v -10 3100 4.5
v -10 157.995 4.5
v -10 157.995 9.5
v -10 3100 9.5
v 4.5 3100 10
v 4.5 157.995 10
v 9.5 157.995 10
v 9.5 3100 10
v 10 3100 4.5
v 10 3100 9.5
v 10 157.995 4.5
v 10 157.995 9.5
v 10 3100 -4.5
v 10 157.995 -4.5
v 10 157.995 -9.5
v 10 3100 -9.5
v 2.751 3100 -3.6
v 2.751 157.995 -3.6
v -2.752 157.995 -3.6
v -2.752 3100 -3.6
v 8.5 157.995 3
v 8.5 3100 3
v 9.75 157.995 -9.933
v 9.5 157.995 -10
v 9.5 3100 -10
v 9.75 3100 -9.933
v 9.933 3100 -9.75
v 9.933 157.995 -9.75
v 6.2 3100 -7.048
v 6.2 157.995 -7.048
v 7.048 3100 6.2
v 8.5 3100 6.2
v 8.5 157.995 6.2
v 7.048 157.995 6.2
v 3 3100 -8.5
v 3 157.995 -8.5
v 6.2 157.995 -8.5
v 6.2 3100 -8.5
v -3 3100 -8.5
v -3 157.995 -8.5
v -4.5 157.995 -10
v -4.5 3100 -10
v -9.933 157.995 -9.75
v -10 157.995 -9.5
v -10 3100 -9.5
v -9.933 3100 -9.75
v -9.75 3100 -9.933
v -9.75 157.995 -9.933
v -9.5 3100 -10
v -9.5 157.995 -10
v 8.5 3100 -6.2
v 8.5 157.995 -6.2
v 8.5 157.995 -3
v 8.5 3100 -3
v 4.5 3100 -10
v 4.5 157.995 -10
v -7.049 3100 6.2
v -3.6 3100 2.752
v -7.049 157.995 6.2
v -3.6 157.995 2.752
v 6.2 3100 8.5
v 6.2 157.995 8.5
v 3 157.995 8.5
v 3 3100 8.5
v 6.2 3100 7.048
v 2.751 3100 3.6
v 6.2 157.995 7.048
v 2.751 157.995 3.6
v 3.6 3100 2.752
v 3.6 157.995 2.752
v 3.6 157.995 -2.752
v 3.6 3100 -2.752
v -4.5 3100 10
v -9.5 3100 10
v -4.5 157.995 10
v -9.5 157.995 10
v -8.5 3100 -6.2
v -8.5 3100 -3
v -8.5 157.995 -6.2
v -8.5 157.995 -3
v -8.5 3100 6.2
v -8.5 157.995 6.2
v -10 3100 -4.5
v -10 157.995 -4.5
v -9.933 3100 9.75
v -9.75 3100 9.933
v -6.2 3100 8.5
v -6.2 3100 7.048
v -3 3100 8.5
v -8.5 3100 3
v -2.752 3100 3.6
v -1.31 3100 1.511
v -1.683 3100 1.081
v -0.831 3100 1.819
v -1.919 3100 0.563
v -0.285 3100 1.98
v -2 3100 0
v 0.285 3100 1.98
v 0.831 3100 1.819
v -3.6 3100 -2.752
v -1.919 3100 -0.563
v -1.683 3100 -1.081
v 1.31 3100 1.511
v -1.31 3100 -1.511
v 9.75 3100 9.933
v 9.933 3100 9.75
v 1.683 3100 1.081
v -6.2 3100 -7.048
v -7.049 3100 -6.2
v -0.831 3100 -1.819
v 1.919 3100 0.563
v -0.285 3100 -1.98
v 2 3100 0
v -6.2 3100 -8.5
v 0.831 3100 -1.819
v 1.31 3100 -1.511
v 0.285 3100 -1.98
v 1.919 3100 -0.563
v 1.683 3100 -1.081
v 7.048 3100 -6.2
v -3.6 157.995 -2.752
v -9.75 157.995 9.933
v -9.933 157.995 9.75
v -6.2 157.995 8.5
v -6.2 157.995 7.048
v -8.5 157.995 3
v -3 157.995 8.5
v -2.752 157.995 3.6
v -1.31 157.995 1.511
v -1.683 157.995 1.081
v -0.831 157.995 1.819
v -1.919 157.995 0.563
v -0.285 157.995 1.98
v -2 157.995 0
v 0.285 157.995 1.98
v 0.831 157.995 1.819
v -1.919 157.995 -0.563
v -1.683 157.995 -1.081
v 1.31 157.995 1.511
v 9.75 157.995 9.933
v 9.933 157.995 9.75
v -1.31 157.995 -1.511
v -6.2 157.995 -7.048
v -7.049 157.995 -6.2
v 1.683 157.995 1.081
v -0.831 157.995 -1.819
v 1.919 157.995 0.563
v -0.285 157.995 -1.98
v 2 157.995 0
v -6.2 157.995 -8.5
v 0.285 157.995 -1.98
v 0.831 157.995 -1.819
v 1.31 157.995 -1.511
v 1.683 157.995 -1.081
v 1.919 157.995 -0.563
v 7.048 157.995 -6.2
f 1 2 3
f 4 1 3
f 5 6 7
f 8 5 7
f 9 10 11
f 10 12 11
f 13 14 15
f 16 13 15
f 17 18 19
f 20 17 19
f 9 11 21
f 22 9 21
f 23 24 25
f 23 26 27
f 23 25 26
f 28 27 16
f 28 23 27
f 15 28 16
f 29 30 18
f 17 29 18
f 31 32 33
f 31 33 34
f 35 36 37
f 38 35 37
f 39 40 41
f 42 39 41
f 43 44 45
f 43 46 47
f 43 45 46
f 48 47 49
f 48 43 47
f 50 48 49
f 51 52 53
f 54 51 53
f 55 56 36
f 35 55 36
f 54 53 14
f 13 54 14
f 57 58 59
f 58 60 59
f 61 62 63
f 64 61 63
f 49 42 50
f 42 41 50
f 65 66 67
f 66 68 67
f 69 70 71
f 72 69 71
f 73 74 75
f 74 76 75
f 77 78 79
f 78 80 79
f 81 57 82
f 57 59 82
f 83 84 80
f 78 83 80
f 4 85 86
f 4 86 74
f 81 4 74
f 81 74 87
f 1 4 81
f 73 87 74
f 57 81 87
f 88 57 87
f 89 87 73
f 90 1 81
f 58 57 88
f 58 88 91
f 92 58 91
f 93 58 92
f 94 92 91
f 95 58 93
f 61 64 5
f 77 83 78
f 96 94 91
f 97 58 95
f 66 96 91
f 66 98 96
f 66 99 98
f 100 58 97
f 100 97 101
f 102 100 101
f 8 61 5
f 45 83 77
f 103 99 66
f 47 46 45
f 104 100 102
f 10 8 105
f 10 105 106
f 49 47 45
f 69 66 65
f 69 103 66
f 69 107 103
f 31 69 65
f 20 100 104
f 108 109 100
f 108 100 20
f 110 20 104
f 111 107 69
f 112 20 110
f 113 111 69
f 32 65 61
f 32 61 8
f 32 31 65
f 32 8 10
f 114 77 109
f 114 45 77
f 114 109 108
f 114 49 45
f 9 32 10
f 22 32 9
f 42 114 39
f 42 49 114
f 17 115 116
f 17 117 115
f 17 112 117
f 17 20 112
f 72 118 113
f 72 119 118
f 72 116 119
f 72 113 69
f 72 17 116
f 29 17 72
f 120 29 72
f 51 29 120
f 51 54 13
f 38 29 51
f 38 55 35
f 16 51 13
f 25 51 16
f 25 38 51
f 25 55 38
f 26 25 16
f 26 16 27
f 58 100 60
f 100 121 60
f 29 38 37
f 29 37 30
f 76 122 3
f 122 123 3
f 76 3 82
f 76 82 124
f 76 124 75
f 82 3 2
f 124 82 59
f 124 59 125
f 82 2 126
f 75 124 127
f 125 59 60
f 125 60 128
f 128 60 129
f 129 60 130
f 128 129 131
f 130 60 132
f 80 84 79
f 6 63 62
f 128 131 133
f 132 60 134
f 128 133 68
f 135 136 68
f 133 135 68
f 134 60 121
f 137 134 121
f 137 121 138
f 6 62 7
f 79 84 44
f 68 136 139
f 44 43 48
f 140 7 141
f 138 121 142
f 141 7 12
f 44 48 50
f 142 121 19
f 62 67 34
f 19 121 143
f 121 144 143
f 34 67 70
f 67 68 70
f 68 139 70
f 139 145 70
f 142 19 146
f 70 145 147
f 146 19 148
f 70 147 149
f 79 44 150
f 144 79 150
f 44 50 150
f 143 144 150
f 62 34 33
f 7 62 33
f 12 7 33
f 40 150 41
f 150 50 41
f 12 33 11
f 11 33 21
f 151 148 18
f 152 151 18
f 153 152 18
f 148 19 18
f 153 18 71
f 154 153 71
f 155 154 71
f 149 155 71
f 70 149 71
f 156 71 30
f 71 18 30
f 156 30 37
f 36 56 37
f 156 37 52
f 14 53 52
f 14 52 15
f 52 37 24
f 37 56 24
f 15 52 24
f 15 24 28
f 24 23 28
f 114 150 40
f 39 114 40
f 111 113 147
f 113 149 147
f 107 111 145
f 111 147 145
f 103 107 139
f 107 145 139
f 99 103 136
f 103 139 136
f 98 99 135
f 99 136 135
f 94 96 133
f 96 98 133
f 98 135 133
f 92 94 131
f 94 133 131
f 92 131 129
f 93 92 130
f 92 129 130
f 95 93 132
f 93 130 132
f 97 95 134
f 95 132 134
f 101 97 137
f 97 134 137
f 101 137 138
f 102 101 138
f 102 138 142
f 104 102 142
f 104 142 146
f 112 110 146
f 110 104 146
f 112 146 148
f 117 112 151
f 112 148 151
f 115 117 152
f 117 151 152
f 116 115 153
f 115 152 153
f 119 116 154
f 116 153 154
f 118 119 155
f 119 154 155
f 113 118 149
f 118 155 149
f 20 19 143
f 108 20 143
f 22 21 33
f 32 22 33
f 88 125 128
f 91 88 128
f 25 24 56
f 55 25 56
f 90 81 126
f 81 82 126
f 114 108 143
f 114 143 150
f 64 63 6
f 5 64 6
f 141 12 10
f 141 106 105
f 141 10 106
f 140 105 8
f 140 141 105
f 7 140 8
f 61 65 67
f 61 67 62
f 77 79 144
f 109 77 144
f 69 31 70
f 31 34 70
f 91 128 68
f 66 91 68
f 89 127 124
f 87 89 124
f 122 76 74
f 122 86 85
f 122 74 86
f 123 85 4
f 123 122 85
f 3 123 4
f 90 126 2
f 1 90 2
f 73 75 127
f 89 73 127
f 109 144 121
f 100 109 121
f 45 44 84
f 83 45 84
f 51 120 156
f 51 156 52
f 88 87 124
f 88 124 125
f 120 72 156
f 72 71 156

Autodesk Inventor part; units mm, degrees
ref_plane "YZ Plane" through (0, 0, 0) normal (1, 0, 0) x (0, 1, 0)
ref_plane "XZ Plane" through (0, 0, 0) normal (0, 1, 0) x (-1, 0, 0)
ref_plane "Work Plane1" through (-2.7515, 150, 3.6) normal (0, 1, 0) x (1, 0, 0)
sketch "Sketch1" plane through (-2.7515, 150, 3.6) normal (0, 1, 0) x (1, 0, 0)
  arc A0 (-6.7485, 13.6) -> (-7.2485, 13.1) centre (-6.7485, 13.1) ccw projected
  line L0 (-7.2485, 13.1) -> (-7.2485, 8.1) projected
  line L1 (-7.2485, 8.1) -> (-5.7485, 6.6) projected
  line L2 (-5.7485, 6.6) -> (-5.7485, 9.8) projected
  line L3 (-5.7485, 9.8) -> (-4.2971, 9.8) projected
  line L4 (-4.2971, 9.8) -> (-0.8485, 6.3515) projected
  line L5 (-0.8485, 6.3515) -> (-0.8485, 0.8485) projected
  line L6 (-0.8485, 0.8485) -> (-4.2971, -2.6) projected
  line L7 (-4.2971, -2.6) -> (-5.7485, -2.6) projected
  line L8 (-5.7485, -2.6) -> (-5.7485, 0.6) projected
  line L9 (-5.7485, 0.6) -> (-7.2485, -0.9) projected
  line L10 (-7.2485, -0.9) -> (-7.2485, -5.9) projected
  arc A1 (-7.2485, -5.9) -> (-6.7485, -6.4) centre (-6.7485, -5.9) ccw projected
  line L11 (-6.7485, -6.4) -> (-1.7485, -6.4) projected
  line L12 (-1.7485, -6.4) -> (-0.2485, -4.9) projected
  line L13 (-0.2485, -4.9) -> (-3.4485, -4.9) projected
  line L14 (-3.4485, -4.9) -> (-3.4485, -3.4485) projected
  line L15 (-3.4485, -3.4485) -> (0, 0) projected
  line L16 (0, 0) -> (5.5029, 0) projected
  line L17 (5.5029, 0) -> (8.9515, -3.4485) projected
  line L18 (8.9515, -3.4485) -> (8.9515, -4.9) projected
  line L19 (8.9515, -4.9) -> (5.7515, -4.9) projected
  line L20 (5.7515, -4.9) -> (7.2515, -6.4) projected
  line L21 (7.2515, -6.4) -> (12.2515, -6.4) projected
  arc A2 (12.2515, -6.4) -> (12.7515, -5.9) centre (12.2515, -5.9) ccw projected
  line L22 (12.7515, -5.9) -> (12.7515, -0.9) projected
  line L23 (12.7515, -0.9) -> (11.2515, 0.6) projected
  line L24 (11.2515, 0.6) -> (11.2515, -2.6) projected
  line L25 (11.2515, -2.6) -> (9.8, -2.6) projected
  line L26 (9.8, -2.6) -> (6.3515, 0.8485) projected
  line L27 (6.3515, 0.8485) -> (6.3515, 6.3515) projected
  line L28 (6.3515, 6.3515) -> (9.8, 9.8) projected
  line L29 (9.8, 9.8) -> (11.2515, 9.8) projected
  line L30 (11.2515, 9.8) -> (11.2515, 6.6) projected
  line L31 (11.2515, 6.6) -> (12.7515, 8.1) projected
  line L32 (12.7515, 8.1) -> (12.7515, 13.1) projected
  arc A3 (12.7515, 13.1) -> (12.2515, 13.6) centre (12.2515, 13.1) ccw projected
  line L33 (12.2515, 13.6) -> (7.2515, 13.6) projected
  line L34 (7.2515, 13.6) -> (5.7515, 12.1) projected
  line L35 (5.7515, 12.1) -> (8.9515, 12.1) projected
  line L36 (8.9515, 12.1) -> (8.9515, 10.6485) projected
  line L37 (8.9515, 10.6485) -> (5.5029, 7.2) projected
  line L38 (5.5029, 7.2) -> (0, 7.2) projected
  line L39 (0, 7.2) -> (-3.4485, 10.6485) projected
  line L40 (-3.4485, 10.6485) -> (-3.4485, 12.1) projected
  line L41 (-3.4485, 12.1) -> (-0.2485, 12.1) projected
  line L42 (-0.2485, 12.1) -> (-1.7485, 13.6) projected
  line L43 (-1.7485, 13.6) -> (-6.7485, 13.6) projected
  circle A4 centre (2.7515, 3.6) radius 2 projected
extrude "Extrusion1" add sketch "Sketch1" along normal blind 2950
ref_plane "Work Plane2" through (9.5, 150, 0) normal (0, 0, 1) x (1, 0, 0)
sketch "Sketch2" plane through (9.5, 150, 0) normal (0, 0, 1) x (1, 0, 0)
  line L0 (-30.0235, 7.9953) -> (9.9765, 7.9953)
  line L1 (9.9765, 7.9953) -> (9.9765, -0.0047)
  line L2 (9.9765, -0.0047) -> (-30.0235, -0.0047)
  line L3 (-30.0235, -0.0047) -> (-30.0235, 7.9953)
  point P0 (-9.5, -150)
  dimension "d2" = 8
  dimension "d3" = 40
extrude "Extrusion2" cut sketch "Sketch2" along normal mid plane 20
ref_plane "Work Plane3" through (-2.7515, 1628.9953, -3.6) normal (0, -1, 0) x (1, 0, 0)
ref_plane "Work Plane6" through (9.5, 150, 10) normal (0, 0, 1) x (1, 0, 0)
properties part number "20x20mmx150mm alminum profile" material "Aluminum 6061"
